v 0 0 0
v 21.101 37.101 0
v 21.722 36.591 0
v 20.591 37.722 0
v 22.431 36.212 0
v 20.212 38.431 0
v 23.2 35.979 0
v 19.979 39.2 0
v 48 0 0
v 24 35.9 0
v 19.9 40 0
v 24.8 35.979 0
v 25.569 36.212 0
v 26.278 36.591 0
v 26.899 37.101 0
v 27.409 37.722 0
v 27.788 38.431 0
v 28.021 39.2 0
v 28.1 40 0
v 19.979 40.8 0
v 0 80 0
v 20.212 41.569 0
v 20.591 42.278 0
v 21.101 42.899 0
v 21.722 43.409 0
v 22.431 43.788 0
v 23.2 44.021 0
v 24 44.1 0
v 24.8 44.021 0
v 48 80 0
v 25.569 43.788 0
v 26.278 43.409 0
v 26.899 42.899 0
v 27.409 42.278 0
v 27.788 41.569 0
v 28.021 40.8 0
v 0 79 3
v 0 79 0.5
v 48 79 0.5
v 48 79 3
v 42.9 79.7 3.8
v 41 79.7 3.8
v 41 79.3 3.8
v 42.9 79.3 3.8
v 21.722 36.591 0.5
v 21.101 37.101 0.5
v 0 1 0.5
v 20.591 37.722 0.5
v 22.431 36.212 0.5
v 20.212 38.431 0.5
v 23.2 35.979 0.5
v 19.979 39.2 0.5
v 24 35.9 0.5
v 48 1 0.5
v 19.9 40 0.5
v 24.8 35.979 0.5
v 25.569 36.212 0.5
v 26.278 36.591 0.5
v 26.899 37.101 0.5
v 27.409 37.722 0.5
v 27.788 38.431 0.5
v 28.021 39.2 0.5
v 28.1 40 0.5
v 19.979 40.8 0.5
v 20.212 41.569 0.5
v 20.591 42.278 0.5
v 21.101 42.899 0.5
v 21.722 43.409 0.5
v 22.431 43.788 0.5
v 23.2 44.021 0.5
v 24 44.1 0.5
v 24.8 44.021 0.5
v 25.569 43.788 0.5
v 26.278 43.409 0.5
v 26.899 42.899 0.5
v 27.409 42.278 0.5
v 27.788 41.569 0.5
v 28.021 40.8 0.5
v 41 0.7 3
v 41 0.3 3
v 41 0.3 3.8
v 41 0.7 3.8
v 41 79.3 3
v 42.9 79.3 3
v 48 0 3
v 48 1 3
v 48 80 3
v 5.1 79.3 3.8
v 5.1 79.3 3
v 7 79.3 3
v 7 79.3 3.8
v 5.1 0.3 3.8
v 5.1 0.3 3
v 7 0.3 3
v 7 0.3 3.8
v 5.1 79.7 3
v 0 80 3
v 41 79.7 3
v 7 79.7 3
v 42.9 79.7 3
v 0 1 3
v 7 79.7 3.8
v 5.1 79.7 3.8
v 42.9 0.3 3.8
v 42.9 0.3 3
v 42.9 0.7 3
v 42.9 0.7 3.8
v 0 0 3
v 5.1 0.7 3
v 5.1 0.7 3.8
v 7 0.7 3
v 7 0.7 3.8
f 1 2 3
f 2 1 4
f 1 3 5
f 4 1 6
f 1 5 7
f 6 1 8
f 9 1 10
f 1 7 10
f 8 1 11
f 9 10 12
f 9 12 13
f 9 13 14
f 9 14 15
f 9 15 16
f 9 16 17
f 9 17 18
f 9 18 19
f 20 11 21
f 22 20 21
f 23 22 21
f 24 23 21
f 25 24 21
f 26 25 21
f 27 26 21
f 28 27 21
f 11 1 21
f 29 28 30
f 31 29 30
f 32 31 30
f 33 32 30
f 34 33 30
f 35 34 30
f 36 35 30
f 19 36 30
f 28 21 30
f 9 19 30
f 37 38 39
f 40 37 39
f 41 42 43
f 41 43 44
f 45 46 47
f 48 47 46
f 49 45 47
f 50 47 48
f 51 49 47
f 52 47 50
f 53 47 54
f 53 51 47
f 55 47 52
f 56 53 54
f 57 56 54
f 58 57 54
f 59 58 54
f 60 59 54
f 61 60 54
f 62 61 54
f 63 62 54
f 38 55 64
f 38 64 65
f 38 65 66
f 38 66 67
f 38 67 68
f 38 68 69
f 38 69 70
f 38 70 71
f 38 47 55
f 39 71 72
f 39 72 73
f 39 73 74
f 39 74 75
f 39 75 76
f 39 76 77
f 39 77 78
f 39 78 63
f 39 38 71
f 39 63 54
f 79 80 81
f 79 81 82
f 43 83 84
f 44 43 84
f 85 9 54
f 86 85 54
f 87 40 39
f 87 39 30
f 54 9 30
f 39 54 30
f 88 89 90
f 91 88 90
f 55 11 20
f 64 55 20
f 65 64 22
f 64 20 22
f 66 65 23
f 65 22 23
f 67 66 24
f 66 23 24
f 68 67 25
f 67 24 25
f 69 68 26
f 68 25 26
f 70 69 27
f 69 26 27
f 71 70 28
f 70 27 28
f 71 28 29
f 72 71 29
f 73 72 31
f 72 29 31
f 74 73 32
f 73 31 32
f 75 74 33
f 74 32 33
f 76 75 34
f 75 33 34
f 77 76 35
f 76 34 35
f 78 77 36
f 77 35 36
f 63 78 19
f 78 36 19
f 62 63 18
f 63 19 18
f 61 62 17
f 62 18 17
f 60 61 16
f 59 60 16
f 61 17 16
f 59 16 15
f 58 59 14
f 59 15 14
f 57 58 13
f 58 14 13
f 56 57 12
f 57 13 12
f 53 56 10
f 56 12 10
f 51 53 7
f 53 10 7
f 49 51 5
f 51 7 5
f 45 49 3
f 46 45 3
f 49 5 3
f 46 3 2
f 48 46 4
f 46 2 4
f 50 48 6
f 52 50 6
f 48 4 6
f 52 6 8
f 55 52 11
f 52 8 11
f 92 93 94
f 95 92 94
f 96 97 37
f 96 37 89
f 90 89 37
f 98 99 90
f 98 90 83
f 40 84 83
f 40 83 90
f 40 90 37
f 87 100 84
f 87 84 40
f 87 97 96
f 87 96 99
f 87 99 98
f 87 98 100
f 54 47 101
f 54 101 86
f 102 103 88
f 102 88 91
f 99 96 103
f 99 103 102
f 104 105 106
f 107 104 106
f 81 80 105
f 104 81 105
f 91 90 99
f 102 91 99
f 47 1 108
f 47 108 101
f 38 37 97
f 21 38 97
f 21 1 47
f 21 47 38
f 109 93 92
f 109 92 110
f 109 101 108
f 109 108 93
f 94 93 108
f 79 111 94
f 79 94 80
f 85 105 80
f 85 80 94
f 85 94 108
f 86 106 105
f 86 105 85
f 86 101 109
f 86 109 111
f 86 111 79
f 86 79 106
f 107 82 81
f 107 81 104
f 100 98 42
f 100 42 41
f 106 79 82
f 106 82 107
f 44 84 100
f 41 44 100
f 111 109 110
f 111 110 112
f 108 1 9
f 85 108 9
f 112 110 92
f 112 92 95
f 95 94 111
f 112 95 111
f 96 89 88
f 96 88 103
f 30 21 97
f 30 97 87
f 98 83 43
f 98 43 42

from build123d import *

# Parameters (mm, degrees)
SKETCH2_W           = 48
SKETCH2_H           = 80
BOSS_EXTRUDE1_DEPTH = 0.5
SKETCH3_W           = 48
SKETCH3_H           = 1
BOSS_EXTRUDE2_DEPTH = 2.5
SKETCH4_W           = 1.9
SKETCH4_H           = 0.4
BOSS_EXTRUDE3_DEPTH = 0.8
SKETCH5_W           = 1.9
SKETCH5_H           = 0.4
BOSS_EXTRUDE4_DEPTH = 0.8
SKETCH6_R           = 4.1
CUT_EXTRUDE2_DEPTH  = 0.5


with BuildPart() as part:
    # Sketch2 → Boss-Extrude1 (new body)
    with BuildSketch(Plane.XY):
        with Locations((24, 40)):
            Rectangle(SKETCH2_W, SKETCH2_H)
    extrude(amount=BOSS_EXTRUDE1_DEPTH)

    # Sketch3 → Boss-Extrude2 (add)
    with BuildSketch(Plane.XY.offset(0.5)):
        with Locations((24, 79.5)):
            Rectangle(SKETCH3_W, SKETCH3_H)
        with Locations((24, 0.5)):
            Rectangle(SKETCH3_W, SKETCH3_H)
    extrude(amount=BOSS_EXTRUDE2_DEPTH)

    # Sketch4 → Boss-Extrude3 (add)
    with BuildSketch(Plane.XY.offset(3)):
        with Locations((6.05, 79.5)):
            Rectangle(SKETCH4_W, SKETCH4_H)
        with Locations((41.95, 79.5)):
            Rectangle(SKETCH4_W, SKETCH4_H)
    extrude(amount=BOSS_EXTRUDE3_DEPTH)

    # Sketch5 → Boss-Extrude4 (add)
    with BuildSketch(Plane.XY.offset(3)):
        with Locations((6.05, 0.5)):
            Rectangle(SKETCH5_W, SKETCH5_H)
        with Locations((41.95, 0.5)):
            Rectangle(SKETCH5_W, SKETCH5_H)
    extrude(amount=BOSS_EXTRUDE4_DEPTH)

    # Sketch6 → Cut-Extrude2 (cut)
    with BuildSketch(Plane(origin=(0, 0, 0), x_dir=(-1, 0, 0), z_dir=(0, 0, -1))):
        with Locations((-24, 40)):
            Circle(SKETCH6_R)
    extrude(amount=-CUT_EXTRUDE2_DEPTH, mode=Mode.SUBTRACT)


solid = part.part
